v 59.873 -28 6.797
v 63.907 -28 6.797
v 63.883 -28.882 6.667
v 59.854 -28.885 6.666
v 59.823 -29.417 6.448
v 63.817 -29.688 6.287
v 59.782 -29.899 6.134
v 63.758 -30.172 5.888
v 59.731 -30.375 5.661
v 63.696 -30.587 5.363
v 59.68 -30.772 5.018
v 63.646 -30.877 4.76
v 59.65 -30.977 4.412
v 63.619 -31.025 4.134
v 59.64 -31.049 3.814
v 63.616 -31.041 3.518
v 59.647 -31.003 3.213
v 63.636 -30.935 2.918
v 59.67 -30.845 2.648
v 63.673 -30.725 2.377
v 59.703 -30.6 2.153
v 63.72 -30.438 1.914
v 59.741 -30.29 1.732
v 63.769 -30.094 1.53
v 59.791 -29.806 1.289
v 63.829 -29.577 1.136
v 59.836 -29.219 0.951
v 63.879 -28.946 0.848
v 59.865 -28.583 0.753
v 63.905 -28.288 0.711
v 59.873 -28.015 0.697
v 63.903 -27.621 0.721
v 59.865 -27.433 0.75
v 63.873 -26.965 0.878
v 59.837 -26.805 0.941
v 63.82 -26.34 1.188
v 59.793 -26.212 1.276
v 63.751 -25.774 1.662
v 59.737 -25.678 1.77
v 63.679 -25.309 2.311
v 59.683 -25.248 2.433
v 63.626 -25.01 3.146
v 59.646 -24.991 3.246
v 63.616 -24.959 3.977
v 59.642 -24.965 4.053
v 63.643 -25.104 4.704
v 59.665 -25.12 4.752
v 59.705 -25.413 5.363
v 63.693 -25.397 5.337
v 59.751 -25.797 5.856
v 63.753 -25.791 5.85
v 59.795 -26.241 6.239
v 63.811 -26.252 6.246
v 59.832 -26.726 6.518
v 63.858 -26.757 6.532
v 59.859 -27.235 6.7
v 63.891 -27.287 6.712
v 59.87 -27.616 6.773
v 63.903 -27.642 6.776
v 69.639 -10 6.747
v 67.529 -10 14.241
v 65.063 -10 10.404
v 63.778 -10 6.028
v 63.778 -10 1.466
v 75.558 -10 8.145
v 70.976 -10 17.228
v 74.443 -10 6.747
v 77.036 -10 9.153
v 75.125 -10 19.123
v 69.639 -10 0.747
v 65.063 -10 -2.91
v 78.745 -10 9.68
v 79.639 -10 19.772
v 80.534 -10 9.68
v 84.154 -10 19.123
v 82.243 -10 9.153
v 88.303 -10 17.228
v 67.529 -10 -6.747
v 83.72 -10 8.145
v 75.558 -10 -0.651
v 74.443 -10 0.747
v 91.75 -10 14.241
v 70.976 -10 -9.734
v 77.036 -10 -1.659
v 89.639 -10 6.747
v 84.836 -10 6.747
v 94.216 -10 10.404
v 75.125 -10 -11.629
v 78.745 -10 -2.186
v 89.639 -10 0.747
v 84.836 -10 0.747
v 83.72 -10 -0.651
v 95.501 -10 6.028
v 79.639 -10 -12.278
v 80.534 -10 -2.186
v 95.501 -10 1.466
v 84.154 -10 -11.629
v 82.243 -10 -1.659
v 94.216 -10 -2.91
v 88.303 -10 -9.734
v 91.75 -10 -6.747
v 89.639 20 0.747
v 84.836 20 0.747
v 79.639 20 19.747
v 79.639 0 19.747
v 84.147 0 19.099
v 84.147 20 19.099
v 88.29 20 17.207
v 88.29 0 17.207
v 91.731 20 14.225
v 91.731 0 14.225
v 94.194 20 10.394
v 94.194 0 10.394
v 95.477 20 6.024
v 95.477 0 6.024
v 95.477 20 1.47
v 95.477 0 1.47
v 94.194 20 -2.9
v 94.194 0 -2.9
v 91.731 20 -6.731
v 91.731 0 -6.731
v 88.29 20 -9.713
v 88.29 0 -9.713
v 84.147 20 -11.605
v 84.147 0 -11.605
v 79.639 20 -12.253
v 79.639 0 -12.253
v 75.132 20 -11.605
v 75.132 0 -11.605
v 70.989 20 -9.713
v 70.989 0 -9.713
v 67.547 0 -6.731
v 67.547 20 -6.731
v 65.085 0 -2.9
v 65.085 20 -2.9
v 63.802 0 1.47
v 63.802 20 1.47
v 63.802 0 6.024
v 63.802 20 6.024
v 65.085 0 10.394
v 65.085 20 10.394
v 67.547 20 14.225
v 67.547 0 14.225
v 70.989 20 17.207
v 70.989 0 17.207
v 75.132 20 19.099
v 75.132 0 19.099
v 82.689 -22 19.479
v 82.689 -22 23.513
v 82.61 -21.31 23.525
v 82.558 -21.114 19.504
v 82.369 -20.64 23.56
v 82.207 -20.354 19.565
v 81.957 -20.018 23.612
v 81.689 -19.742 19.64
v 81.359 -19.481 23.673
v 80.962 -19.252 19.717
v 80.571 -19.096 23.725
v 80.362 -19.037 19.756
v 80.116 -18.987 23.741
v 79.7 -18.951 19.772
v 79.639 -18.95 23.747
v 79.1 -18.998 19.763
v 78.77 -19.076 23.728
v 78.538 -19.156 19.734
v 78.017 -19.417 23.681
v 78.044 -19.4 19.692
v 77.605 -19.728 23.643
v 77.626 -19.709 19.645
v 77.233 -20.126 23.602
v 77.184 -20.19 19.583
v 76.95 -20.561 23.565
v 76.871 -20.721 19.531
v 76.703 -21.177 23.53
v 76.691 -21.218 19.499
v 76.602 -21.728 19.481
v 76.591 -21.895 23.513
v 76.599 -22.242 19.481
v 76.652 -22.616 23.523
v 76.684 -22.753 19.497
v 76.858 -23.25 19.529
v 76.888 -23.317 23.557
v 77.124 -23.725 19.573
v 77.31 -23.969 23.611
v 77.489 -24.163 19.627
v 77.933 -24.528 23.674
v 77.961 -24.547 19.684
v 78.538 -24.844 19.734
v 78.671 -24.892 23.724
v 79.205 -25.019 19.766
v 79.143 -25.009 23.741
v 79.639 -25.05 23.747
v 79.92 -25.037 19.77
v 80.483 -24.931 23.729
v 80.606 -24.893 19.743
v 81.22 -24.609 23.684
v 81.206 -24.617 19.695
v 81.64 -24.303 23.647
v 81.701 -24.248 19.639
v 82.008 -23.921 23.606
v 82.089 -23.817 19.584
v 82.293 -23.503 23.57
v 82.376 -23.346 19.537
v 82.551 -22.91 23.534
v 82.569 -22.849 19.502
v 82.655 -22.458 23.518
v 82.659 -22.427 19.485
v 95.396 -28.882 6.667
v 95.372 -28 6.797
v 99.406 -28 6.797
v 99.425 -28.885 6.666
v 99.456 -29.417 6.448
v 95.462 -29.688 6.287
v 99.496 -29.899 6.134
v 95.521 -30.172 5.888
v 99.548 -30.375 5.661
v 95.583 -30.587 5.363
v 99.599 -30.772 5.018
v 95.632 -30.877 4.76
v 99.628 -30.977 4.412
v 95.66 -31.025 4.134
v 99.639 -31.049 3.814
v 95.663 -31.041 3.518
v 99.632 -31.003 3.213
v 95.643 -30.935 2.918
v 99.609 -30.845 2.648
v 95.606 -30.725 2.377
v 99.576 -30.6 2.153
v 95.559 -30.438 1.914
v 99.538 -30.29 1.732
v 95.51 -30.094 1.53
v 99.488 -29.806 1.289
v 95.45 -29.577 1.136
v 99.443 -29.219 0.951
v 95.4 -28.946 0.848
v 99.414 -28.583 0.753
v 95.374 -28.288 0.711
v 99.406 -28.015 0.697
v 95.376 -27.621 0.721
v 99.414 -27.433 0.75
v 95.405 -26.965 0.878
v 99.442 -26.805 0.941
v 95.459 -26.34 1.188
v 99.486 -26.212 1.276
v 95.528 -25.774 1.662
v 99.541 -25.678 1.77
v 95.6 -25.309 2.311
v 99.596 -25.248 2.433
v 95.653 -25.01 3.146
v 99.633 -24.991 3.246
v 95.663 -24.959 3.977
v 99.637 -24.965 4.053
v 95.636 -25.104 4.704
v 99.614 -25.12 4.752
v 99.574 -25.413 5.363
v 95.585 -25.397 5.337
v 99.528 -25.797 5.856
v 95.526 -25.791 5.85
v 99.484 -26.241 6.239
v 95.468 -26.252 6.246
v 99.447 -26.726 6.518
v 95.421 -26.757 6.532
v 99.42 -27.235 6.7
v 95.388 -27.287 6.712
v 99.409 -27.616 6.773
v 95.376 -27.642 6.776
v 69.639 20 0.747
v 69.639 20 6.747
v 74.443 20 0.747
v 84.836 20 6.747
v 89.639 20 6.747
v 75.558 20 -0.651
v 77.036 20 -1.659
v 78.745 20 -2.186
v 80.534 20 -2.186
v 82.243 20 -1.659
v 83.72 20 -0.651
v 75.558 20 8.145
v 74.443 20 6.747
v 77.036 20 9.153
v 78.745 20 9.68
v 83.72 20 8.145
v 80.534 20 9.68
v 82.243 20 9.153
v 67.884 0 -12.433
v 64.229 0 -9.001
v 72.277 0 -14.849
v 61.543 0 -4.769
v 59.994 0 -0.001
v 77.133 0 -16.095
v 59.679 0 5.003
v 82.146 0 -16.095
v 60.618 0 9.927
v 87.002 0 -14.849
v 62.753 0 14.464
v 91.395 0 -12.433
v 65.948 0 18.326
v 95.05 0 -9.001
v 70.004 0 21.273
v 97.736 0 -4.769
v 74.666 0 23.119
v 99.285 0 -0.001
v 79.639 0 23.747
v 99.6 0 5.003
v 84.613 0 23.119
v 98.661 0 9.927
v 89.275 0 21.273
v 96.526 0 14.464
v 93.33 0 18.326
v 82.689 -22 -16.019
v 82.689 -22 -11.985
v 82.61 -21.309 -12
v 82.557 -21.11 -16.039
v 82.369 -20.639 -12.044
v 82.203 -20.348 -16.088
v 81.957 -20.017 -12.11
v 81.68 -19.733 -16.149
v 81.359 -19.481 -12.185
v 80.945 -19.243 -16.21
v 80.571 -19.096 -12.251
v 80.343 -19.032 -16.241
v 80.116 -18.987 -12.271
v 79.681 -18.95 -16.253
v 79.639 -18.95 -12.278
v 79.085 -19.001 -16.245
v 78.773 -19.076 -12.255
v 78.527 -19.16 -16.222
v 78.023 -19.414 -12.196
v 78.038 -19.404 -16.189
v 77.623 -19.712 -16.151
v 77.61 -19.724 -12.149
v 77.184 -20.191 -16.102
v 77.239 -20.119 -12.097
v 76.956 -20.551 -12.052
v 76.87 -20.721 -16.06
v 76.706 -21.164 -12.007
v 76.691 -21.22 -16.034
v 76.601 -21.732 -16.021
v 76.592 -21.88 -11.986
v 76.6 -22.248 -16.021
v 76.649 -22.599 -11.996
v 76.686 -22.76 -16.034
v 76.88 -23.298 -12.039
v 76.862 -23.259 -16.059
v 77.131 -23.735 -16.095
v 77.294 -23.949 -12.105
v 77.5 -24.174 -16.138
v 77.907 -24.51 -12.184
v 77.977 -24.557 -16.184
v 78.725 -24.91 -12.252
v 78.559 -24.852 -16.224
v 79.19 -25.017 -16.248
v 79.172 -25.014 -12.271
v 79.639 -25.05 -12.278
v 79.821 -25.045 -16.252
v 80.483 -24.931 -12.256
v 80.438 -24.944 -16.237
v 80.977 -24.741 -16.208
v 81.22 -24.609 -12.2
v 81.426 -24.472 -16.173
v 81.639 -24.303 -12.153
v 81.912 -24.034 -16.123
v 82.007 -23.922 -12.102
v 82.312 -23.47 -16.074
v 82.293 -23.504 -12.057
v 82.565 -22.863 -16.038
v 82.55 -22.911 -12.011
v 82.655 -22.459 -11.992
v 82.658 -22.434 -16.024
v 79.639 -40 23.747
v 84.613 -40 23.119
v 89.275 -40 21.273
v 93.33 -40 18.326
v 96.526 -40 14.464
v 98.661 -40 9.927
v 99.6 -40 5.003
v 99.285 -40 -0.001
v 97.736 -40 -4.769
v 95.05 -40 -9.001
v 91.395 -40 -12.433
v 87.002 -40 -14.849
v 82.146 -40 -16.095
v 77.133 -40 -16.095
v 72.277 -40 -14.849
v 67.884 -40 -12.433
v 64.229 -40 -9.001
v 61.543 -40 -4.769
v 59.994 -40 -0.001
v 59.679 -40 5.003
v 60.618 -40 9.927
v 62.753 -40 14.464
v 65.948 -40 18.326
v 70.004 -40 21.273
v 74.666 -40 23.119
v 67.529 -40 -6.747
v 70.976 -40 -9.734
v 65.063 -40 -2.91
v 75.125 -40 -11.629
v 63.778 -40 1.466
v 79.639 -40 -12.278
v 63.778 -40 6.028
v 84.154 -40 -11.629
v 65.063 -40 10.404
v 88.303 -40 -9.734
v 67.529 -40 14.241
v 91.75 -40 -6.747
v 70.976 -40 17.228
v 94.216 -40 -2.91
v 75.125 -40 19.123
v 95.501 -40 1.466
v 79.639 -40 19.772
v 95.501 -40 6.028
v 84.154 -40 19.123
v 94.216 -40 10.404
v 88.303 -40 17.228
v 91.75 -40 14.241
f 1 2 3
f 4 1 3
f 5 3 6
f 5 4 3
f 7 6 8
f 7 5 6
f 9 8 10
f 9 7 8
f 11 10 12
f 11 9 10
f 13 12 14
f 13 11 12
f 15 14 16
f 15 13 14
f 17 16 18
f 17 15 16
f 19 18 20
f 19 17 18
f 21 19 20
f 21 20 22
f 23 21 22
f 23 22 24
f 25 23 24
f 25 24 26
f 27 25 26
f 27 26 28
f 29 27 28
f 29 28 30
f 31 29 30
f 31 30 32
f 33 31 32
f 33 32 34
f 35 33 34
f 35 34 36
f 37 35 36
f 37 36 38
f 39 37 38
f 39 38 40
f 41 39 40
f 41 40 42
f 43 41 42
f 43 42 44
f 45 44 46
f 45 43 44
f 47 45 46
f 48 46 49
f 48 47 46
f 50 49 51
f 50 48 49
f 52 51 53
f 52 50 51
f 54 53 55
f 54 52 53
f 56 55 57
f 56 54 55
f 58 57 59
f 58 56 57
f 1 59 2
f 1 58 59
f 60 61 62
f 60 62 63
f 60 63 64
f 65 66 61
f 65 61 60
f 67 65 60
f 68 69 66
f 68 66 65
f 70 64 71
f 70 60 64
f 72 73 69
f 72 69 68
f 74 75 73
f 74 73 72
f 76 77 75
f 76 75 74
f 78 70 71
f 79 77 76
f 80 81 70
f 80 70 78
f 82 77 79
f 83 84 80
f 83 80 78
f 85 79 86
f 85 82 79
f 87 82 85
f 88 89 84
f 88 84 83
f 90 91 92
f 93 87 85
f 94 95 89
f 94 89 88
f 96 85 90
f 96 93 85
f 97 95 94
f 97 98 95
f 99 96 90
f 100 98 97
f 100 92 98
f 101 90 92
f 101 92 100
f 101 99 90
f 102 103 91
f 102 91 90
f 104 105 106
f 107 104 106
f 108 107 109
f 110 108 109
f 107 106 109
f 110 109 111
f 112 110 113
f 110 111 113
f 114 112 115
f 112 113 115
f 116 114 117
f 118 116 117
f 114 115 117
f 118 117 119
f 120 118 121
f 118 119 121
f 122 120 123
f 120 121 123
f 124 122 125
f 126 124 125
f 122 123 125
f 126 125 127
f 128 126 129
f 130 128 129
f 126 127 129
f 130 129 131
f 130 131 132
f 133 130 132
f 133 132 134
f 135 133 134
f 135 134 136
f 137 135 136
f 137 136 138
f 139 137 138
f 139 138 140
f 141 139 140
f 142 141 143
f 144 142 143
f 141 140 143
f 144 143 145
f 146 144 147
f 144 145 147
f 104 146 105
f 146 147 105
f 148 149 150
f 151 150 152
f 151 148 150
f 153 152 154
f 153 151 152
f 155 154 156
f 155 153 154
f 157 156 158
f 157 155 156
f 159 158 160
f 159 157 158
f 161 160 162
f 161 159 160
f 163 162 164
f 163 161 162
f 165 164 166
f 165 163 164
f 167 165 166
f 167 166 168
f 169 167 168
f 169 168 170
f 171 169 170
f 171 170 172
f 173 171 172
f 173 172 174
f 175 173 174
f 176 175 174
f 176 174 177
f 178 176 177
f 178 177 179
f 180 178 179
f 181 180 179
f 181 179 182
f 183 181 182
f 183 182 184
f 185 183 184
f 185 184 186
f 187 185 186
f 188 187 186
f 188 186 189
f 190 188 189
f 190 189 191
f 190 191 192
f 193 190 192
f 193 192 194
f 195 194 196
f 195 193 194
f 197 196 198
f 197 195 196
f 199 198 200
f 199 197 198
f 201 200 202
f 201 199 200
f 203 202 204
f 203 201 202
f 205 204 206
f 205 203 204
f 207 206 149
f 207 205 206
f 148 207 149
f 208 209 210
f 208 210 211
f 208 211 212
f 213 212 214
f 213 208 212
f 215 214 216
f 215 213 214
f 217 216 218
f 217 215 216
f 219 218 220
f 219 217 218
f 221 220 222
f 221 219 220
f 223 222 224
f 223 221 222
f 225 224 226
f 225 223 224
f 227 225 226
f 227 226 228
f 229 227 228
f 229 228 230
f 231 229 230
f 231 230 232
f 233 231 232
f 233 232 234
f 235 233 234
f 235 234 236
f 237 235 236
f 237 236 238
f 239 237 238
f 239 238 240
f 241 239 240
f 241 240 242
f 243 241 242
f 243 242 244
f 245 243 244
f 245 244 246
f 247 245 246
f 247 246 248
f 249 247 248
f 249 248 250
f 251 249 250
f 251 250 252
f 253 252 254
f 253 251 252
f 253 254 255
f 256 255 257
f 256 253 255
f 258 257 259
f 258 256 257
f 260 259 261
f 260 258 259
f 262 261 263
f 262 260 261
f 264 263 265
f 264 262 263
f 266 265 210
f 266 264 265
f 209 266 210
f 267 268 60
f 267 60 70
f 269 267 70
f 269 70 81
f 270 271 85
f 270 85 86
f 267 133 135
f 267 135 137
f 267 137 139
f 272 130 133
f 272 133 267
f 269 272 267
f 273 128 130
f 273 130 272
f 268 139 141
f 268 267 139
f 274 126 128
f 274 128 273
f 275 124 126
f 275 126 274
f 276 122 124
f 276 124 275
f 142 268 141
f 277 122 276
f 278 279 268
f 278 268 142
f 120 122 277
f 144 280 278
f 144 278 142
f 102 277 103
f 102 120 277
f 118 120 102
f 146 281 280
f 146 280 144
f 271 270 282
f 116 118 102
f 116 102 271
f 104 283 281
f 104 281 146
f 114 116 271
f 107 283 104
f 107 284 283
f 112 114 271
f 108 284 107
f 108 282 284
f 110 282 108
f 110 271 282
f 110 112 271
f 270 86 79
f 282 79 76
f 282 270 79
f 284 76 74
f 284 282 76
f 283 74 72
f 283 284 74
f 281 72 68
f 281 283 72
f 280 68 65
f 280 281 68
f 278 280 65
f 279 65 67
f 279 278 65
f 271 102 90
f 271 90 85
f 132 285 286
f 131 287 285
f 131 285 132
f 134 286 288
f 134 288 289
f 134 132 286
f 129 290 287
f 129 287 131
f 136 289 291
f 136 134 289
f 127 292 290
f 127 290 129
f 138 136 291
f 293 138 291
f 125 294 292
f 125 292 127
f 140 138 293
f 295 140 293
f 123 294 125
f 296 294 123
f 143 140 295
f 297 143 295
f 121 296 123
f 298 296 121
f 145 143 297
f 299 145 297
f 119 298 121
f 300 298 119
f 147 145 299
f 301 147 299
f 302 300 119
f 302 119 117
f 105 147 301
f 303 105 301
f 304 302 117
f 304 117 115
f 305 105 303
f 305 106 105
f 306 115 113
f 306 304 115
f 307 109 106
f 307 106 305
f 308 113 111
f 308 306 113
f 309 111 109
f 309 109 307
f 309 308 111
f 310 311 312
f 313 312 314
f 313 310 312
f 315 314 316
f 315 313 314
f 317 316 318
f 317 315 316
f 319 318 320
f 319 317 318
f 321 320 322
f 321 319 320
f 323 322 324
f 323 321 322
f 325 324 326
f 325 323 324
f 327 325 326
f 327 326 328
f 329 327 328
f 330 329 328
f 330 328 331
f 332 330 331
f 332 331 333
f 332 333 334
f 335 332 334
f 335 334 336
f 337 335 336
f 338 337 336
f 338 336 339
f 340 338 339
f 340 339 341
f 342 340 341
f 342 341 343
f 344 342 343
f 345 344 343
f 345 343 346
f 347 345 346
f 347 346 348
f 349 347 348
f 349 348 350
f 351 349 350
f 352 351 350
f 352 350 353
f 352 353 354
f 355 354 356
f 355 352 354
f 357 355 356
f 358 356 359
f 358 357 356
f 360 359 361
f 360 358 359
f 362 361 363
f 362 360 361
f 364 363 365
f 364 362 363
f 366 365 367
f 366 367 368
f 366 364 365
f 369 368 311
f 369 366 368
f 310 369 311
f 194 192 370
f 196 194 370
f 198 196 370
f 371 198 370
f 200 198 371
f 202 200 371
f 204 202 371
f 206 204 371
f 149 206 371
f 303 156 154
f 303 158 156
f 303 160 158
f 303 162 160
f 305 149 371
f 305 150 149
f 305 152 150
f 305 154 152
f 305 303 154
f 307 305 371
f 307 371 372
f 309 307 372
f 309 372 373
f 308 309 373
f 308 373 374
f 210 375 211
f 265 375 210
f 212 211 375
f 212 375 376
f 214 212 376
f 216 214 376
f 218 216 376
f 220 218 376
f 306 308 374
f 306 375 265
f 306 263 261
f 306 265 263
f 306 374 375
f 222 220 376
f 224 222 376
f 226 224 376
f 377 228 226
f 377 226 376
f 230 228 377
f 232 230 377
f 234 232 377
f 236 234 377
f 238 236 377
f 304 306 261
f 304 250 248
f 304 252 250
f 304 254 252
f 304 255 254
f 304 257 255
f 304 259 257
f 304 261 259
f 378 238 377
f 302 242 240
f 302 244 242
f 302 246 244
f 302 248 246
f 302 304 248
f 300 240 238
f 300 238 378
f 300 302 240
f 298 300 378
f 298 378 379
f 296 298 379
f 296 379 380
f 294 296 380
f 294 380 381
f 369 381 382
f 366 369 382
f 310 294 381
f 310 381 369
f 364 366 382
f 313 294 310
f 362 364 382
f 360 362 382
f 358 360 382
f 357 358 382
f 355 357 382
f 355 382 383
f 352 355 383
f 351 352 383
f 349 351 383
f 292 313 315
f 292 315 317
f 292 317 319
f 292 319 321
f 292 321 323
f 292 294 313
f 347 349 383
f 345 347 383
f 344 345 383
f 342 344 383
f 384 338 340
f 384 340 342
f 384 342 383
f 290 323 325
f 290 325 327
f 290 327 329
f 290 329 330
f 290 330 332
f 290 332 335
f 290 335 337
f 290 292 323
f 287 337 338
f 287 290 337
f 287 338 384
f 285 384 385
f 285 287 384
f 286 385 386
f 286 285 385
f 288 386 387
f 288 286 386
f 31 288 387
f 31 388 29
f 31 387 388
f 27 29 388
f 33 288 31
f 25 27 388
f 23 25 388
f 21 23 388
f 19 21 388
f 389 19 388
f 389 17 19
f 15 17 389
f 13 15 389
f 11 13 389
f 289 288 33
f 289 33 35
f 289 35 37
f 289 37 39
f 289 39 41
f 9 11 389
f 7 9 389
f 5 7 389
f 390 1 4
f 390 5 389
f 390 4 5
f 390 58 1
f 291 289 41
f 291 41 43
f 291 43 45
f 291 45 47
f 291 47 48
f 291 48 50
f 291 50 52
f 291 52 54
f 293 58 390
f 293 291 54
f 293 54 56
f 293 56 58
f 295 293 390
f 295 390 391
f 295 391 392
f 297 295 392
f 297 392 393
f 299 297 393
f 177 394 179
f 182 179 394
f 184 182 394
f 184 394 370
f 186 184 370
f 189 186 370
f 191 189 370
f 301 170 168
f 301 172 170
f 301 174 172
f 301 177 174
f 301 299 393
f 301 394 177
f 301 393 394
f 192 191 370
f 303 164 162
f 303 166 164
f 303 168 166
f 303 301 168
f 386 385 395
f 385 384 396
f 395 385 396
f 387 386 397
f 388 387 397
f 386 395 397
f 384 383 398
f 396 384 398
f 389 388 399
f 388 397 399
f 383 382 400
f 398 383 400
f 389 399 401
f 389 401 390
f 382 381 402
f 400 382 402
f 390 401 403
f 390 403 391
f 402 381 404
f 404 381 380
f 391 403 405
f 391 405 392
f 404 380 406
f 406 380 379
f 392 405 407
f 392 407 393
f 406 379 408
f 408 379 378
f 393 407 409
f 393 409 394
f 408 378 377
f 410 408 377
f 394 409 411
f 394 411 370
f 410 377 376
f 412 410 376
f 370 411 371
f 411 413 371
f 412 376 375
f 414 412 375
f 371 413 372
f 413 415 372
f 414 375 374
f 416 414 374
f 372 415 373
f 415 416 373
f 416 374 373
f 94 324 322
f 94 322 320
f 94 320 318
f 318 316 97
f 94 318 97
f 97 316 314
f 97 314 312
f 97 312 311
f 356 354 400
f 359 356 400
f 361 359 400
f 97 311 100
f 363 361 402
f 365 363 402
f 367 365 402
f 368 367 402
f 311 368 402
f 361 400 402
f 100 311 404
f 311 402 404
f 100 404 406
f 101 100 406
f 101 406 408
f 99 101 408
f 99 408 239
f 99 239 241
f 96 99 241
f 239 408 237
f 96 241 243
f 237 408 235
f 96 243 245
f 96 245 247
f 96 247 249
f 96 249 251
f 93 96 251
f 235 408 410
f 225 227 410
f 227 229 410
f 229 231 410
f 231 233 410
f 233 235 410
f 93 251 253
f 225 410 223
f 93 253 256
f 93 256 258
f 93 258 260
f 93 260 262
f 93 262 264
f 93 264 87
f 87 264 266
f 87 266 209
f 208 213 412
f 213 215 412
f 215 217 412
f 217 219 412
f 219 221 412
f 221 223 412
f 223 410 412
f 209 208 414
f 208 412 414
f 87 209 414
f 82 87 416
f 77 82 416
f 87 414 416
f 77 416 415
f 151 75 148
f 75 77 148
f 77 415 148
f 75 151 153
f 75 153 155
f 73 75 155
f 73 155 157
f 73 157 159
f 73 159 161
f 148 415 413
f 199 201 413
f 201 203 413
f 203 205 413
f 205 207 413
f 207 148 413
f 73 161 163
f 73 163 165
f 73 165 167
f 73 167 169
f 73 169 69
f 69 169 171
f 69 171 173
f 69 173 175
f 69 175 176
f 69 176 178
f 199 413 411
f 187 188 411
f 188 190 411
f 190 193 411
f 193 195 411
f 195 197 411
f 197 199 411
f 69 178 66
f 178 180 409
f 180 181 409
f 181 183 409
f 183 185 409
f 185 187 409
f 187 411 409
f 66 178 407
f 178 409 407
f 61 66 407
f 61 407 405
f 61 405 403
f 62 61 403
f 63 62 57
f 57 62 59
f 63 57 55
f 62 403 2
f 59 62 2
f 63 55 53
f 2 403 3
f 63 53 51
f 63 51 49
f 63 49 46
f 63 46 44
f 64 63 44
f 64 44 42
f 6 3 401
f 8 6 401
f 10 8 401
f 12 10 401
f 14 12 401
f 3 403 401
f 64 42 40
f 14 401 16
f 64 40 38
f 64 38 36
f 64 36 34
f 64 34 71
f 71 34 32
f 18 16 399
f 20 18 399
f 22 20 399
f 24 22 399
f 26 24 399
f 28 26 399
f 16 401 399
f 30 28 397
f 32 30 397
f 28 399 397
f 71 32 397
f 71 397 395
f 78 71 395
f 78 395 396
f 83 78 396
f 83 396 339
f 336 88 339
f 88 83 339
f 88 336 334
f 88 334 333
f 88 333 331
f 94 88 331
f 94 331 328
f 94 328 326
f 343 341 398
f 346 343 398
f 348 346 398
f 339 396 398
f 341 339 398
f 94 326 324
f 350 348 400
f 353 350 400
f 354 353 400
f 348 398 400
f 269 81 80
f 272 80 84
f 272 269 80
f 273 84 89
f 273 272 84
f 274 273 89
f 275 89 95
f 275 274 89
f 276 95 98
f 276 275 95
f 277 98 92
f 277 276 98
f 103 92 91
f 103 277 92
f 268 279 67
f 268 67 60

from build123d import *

# Parameters (mm, degrees)
SKETCH_8_R               = 16
EXTRUDE_3_DEPTH          = 20
SKETCH_8_4_R             = 20
EXTRUDE_4_DEPTH          = 40
CUT_EXTRUDE_6_REACH      = 120.709
CUT_EXTRUDE_7_DEPTH      = 110.963350072
CUT_EXTRUDE_7_DEPTH_BACK = 110.963350072
SKETCH_11_R              = 3.05
SKETCH_12_R              = 16.025
CUT_EXTRUDE_8_DEPTH      = 30
CUT_EXTRUDE_9_DEPTH      = 110.963350224
CUT_EXTRUDE_9_DEPTH_BACK = 110.963350224
SKETCH_14_R              = 3.05


with BuildPart() as part:
    # 草图8 → 凸台-拉伸3 (new body)
    with BuildSketch(Plane(origin=(0, 0, 0), x_dir=(1, 0, 0), z_dir=(0, 1, 0))):
        with Locations((79.639435379, -3.747026688)):
            Circle(SKETCH_8_R)
    extrude(amount=EXTRUDE_3_DEPTH)

    # 草图8<4> → 凸台-拉伸4 (add)
    with BuildSketch(Plane(origin=(0, 0, 0), x_dir=(1, 0, 0), z_dir=(0, 1, 0))):
        with Locations((79.639435379, -3.747026688)):
            Circle(SKETCH_8_4_R)
    extrude(amount=-EXTRUDE_4_DEPTH)

    # 草图10 → 切除-拉伸6 (cut, up to next)
    with BuildSketch(Plane(origin=(0, 20, 0), x_dir=(1, 0, 0), z_dir=(0, 1, 0)), mode=Mode.PRIVATE) as cut_extrude_6_sk1:
        with BuildLine():
            Line((84.835587801, -0.747026688), (89.639435379, -0.747026688))
            Line((89.639435379, -0.747026688), (89.639435379, -6.747026688))
            Line((89.639435379, -6.747026688), (84.835587801, -6.747026688))
            ThreePointArc((84.835587801, -6.747026688), (79.639435379, -9.747026688), (74.443282956, -6.747026688))
            Line((74.443282956, -6.747026688), (69.639435379, -6.747026688))
            Line((69.639435379, -6.747026688), (69.639435379, -0.747026688))
            Line((69.639435379, -0.747026688), (74.443282956, -0.747026688))
            ThreePointArc((74.443282956, -0.747026688), (79.639435379, 2.252973312), (84.835587801, -0.747026688))
        make_face()
    cut_extrude_6_tool1 = extrude(cut_extrude_6_sk1.sketch, amount=-CUT_EXTRUDE_6_REACH, mode=Mode.PRIVATE) & part.part
    add(cut_extrude_6_tool1.solids().sort_by_distance((79.639435, 20, 3.747027))[0], mode=Mode.SUBTRACT)

    # 草图11 → 切除-拉伸7 (cut, two sides: drawn at the far end of the back side and taken through both)
    with BuildSketch(Plane.XY.offset(-CUT_EXTRUDE_7_DEPTH_BACK)):
        with Locations((79.639435379, -22)):
            Circle(SKETCH_11_R)
    extrude(amount=CUT_EXTRUDE_7_DEPTH + CUT_EXTRUDE_7_DEPTH_BACK, mode=Mode.SUBTRACT)

    # 草图12 → 切除-拉伸8 (cut)
    with BuildSketch(Plane.XZ.offset(40)):
        with Locations((79.639435379, 3.747026688)):
            Circle(SKETCH_12_R)
    extrude(amount=-CUT_EXTRUDE_8_DEPTH, mode=Mode.SUBTRACT)

    # 草图14 → 切除-拉伸9 (cut, two sides: drawn at the far end of the back side and taken through both)
    with BuildSketch(Plane.YZ.offset(-CUT_EXTRUDE_9_DEPTH_BACK)):
        with Locations((-28, 3.747026688)):
            Circle(SKETCH_14_R)
    extrude(amount=CUT_EXTRUDE_9_DEPTH + CUT_EXTRUDE_9_DEPTH_BACK, mode=Mode.SUBTRACT)


solid = part.part
